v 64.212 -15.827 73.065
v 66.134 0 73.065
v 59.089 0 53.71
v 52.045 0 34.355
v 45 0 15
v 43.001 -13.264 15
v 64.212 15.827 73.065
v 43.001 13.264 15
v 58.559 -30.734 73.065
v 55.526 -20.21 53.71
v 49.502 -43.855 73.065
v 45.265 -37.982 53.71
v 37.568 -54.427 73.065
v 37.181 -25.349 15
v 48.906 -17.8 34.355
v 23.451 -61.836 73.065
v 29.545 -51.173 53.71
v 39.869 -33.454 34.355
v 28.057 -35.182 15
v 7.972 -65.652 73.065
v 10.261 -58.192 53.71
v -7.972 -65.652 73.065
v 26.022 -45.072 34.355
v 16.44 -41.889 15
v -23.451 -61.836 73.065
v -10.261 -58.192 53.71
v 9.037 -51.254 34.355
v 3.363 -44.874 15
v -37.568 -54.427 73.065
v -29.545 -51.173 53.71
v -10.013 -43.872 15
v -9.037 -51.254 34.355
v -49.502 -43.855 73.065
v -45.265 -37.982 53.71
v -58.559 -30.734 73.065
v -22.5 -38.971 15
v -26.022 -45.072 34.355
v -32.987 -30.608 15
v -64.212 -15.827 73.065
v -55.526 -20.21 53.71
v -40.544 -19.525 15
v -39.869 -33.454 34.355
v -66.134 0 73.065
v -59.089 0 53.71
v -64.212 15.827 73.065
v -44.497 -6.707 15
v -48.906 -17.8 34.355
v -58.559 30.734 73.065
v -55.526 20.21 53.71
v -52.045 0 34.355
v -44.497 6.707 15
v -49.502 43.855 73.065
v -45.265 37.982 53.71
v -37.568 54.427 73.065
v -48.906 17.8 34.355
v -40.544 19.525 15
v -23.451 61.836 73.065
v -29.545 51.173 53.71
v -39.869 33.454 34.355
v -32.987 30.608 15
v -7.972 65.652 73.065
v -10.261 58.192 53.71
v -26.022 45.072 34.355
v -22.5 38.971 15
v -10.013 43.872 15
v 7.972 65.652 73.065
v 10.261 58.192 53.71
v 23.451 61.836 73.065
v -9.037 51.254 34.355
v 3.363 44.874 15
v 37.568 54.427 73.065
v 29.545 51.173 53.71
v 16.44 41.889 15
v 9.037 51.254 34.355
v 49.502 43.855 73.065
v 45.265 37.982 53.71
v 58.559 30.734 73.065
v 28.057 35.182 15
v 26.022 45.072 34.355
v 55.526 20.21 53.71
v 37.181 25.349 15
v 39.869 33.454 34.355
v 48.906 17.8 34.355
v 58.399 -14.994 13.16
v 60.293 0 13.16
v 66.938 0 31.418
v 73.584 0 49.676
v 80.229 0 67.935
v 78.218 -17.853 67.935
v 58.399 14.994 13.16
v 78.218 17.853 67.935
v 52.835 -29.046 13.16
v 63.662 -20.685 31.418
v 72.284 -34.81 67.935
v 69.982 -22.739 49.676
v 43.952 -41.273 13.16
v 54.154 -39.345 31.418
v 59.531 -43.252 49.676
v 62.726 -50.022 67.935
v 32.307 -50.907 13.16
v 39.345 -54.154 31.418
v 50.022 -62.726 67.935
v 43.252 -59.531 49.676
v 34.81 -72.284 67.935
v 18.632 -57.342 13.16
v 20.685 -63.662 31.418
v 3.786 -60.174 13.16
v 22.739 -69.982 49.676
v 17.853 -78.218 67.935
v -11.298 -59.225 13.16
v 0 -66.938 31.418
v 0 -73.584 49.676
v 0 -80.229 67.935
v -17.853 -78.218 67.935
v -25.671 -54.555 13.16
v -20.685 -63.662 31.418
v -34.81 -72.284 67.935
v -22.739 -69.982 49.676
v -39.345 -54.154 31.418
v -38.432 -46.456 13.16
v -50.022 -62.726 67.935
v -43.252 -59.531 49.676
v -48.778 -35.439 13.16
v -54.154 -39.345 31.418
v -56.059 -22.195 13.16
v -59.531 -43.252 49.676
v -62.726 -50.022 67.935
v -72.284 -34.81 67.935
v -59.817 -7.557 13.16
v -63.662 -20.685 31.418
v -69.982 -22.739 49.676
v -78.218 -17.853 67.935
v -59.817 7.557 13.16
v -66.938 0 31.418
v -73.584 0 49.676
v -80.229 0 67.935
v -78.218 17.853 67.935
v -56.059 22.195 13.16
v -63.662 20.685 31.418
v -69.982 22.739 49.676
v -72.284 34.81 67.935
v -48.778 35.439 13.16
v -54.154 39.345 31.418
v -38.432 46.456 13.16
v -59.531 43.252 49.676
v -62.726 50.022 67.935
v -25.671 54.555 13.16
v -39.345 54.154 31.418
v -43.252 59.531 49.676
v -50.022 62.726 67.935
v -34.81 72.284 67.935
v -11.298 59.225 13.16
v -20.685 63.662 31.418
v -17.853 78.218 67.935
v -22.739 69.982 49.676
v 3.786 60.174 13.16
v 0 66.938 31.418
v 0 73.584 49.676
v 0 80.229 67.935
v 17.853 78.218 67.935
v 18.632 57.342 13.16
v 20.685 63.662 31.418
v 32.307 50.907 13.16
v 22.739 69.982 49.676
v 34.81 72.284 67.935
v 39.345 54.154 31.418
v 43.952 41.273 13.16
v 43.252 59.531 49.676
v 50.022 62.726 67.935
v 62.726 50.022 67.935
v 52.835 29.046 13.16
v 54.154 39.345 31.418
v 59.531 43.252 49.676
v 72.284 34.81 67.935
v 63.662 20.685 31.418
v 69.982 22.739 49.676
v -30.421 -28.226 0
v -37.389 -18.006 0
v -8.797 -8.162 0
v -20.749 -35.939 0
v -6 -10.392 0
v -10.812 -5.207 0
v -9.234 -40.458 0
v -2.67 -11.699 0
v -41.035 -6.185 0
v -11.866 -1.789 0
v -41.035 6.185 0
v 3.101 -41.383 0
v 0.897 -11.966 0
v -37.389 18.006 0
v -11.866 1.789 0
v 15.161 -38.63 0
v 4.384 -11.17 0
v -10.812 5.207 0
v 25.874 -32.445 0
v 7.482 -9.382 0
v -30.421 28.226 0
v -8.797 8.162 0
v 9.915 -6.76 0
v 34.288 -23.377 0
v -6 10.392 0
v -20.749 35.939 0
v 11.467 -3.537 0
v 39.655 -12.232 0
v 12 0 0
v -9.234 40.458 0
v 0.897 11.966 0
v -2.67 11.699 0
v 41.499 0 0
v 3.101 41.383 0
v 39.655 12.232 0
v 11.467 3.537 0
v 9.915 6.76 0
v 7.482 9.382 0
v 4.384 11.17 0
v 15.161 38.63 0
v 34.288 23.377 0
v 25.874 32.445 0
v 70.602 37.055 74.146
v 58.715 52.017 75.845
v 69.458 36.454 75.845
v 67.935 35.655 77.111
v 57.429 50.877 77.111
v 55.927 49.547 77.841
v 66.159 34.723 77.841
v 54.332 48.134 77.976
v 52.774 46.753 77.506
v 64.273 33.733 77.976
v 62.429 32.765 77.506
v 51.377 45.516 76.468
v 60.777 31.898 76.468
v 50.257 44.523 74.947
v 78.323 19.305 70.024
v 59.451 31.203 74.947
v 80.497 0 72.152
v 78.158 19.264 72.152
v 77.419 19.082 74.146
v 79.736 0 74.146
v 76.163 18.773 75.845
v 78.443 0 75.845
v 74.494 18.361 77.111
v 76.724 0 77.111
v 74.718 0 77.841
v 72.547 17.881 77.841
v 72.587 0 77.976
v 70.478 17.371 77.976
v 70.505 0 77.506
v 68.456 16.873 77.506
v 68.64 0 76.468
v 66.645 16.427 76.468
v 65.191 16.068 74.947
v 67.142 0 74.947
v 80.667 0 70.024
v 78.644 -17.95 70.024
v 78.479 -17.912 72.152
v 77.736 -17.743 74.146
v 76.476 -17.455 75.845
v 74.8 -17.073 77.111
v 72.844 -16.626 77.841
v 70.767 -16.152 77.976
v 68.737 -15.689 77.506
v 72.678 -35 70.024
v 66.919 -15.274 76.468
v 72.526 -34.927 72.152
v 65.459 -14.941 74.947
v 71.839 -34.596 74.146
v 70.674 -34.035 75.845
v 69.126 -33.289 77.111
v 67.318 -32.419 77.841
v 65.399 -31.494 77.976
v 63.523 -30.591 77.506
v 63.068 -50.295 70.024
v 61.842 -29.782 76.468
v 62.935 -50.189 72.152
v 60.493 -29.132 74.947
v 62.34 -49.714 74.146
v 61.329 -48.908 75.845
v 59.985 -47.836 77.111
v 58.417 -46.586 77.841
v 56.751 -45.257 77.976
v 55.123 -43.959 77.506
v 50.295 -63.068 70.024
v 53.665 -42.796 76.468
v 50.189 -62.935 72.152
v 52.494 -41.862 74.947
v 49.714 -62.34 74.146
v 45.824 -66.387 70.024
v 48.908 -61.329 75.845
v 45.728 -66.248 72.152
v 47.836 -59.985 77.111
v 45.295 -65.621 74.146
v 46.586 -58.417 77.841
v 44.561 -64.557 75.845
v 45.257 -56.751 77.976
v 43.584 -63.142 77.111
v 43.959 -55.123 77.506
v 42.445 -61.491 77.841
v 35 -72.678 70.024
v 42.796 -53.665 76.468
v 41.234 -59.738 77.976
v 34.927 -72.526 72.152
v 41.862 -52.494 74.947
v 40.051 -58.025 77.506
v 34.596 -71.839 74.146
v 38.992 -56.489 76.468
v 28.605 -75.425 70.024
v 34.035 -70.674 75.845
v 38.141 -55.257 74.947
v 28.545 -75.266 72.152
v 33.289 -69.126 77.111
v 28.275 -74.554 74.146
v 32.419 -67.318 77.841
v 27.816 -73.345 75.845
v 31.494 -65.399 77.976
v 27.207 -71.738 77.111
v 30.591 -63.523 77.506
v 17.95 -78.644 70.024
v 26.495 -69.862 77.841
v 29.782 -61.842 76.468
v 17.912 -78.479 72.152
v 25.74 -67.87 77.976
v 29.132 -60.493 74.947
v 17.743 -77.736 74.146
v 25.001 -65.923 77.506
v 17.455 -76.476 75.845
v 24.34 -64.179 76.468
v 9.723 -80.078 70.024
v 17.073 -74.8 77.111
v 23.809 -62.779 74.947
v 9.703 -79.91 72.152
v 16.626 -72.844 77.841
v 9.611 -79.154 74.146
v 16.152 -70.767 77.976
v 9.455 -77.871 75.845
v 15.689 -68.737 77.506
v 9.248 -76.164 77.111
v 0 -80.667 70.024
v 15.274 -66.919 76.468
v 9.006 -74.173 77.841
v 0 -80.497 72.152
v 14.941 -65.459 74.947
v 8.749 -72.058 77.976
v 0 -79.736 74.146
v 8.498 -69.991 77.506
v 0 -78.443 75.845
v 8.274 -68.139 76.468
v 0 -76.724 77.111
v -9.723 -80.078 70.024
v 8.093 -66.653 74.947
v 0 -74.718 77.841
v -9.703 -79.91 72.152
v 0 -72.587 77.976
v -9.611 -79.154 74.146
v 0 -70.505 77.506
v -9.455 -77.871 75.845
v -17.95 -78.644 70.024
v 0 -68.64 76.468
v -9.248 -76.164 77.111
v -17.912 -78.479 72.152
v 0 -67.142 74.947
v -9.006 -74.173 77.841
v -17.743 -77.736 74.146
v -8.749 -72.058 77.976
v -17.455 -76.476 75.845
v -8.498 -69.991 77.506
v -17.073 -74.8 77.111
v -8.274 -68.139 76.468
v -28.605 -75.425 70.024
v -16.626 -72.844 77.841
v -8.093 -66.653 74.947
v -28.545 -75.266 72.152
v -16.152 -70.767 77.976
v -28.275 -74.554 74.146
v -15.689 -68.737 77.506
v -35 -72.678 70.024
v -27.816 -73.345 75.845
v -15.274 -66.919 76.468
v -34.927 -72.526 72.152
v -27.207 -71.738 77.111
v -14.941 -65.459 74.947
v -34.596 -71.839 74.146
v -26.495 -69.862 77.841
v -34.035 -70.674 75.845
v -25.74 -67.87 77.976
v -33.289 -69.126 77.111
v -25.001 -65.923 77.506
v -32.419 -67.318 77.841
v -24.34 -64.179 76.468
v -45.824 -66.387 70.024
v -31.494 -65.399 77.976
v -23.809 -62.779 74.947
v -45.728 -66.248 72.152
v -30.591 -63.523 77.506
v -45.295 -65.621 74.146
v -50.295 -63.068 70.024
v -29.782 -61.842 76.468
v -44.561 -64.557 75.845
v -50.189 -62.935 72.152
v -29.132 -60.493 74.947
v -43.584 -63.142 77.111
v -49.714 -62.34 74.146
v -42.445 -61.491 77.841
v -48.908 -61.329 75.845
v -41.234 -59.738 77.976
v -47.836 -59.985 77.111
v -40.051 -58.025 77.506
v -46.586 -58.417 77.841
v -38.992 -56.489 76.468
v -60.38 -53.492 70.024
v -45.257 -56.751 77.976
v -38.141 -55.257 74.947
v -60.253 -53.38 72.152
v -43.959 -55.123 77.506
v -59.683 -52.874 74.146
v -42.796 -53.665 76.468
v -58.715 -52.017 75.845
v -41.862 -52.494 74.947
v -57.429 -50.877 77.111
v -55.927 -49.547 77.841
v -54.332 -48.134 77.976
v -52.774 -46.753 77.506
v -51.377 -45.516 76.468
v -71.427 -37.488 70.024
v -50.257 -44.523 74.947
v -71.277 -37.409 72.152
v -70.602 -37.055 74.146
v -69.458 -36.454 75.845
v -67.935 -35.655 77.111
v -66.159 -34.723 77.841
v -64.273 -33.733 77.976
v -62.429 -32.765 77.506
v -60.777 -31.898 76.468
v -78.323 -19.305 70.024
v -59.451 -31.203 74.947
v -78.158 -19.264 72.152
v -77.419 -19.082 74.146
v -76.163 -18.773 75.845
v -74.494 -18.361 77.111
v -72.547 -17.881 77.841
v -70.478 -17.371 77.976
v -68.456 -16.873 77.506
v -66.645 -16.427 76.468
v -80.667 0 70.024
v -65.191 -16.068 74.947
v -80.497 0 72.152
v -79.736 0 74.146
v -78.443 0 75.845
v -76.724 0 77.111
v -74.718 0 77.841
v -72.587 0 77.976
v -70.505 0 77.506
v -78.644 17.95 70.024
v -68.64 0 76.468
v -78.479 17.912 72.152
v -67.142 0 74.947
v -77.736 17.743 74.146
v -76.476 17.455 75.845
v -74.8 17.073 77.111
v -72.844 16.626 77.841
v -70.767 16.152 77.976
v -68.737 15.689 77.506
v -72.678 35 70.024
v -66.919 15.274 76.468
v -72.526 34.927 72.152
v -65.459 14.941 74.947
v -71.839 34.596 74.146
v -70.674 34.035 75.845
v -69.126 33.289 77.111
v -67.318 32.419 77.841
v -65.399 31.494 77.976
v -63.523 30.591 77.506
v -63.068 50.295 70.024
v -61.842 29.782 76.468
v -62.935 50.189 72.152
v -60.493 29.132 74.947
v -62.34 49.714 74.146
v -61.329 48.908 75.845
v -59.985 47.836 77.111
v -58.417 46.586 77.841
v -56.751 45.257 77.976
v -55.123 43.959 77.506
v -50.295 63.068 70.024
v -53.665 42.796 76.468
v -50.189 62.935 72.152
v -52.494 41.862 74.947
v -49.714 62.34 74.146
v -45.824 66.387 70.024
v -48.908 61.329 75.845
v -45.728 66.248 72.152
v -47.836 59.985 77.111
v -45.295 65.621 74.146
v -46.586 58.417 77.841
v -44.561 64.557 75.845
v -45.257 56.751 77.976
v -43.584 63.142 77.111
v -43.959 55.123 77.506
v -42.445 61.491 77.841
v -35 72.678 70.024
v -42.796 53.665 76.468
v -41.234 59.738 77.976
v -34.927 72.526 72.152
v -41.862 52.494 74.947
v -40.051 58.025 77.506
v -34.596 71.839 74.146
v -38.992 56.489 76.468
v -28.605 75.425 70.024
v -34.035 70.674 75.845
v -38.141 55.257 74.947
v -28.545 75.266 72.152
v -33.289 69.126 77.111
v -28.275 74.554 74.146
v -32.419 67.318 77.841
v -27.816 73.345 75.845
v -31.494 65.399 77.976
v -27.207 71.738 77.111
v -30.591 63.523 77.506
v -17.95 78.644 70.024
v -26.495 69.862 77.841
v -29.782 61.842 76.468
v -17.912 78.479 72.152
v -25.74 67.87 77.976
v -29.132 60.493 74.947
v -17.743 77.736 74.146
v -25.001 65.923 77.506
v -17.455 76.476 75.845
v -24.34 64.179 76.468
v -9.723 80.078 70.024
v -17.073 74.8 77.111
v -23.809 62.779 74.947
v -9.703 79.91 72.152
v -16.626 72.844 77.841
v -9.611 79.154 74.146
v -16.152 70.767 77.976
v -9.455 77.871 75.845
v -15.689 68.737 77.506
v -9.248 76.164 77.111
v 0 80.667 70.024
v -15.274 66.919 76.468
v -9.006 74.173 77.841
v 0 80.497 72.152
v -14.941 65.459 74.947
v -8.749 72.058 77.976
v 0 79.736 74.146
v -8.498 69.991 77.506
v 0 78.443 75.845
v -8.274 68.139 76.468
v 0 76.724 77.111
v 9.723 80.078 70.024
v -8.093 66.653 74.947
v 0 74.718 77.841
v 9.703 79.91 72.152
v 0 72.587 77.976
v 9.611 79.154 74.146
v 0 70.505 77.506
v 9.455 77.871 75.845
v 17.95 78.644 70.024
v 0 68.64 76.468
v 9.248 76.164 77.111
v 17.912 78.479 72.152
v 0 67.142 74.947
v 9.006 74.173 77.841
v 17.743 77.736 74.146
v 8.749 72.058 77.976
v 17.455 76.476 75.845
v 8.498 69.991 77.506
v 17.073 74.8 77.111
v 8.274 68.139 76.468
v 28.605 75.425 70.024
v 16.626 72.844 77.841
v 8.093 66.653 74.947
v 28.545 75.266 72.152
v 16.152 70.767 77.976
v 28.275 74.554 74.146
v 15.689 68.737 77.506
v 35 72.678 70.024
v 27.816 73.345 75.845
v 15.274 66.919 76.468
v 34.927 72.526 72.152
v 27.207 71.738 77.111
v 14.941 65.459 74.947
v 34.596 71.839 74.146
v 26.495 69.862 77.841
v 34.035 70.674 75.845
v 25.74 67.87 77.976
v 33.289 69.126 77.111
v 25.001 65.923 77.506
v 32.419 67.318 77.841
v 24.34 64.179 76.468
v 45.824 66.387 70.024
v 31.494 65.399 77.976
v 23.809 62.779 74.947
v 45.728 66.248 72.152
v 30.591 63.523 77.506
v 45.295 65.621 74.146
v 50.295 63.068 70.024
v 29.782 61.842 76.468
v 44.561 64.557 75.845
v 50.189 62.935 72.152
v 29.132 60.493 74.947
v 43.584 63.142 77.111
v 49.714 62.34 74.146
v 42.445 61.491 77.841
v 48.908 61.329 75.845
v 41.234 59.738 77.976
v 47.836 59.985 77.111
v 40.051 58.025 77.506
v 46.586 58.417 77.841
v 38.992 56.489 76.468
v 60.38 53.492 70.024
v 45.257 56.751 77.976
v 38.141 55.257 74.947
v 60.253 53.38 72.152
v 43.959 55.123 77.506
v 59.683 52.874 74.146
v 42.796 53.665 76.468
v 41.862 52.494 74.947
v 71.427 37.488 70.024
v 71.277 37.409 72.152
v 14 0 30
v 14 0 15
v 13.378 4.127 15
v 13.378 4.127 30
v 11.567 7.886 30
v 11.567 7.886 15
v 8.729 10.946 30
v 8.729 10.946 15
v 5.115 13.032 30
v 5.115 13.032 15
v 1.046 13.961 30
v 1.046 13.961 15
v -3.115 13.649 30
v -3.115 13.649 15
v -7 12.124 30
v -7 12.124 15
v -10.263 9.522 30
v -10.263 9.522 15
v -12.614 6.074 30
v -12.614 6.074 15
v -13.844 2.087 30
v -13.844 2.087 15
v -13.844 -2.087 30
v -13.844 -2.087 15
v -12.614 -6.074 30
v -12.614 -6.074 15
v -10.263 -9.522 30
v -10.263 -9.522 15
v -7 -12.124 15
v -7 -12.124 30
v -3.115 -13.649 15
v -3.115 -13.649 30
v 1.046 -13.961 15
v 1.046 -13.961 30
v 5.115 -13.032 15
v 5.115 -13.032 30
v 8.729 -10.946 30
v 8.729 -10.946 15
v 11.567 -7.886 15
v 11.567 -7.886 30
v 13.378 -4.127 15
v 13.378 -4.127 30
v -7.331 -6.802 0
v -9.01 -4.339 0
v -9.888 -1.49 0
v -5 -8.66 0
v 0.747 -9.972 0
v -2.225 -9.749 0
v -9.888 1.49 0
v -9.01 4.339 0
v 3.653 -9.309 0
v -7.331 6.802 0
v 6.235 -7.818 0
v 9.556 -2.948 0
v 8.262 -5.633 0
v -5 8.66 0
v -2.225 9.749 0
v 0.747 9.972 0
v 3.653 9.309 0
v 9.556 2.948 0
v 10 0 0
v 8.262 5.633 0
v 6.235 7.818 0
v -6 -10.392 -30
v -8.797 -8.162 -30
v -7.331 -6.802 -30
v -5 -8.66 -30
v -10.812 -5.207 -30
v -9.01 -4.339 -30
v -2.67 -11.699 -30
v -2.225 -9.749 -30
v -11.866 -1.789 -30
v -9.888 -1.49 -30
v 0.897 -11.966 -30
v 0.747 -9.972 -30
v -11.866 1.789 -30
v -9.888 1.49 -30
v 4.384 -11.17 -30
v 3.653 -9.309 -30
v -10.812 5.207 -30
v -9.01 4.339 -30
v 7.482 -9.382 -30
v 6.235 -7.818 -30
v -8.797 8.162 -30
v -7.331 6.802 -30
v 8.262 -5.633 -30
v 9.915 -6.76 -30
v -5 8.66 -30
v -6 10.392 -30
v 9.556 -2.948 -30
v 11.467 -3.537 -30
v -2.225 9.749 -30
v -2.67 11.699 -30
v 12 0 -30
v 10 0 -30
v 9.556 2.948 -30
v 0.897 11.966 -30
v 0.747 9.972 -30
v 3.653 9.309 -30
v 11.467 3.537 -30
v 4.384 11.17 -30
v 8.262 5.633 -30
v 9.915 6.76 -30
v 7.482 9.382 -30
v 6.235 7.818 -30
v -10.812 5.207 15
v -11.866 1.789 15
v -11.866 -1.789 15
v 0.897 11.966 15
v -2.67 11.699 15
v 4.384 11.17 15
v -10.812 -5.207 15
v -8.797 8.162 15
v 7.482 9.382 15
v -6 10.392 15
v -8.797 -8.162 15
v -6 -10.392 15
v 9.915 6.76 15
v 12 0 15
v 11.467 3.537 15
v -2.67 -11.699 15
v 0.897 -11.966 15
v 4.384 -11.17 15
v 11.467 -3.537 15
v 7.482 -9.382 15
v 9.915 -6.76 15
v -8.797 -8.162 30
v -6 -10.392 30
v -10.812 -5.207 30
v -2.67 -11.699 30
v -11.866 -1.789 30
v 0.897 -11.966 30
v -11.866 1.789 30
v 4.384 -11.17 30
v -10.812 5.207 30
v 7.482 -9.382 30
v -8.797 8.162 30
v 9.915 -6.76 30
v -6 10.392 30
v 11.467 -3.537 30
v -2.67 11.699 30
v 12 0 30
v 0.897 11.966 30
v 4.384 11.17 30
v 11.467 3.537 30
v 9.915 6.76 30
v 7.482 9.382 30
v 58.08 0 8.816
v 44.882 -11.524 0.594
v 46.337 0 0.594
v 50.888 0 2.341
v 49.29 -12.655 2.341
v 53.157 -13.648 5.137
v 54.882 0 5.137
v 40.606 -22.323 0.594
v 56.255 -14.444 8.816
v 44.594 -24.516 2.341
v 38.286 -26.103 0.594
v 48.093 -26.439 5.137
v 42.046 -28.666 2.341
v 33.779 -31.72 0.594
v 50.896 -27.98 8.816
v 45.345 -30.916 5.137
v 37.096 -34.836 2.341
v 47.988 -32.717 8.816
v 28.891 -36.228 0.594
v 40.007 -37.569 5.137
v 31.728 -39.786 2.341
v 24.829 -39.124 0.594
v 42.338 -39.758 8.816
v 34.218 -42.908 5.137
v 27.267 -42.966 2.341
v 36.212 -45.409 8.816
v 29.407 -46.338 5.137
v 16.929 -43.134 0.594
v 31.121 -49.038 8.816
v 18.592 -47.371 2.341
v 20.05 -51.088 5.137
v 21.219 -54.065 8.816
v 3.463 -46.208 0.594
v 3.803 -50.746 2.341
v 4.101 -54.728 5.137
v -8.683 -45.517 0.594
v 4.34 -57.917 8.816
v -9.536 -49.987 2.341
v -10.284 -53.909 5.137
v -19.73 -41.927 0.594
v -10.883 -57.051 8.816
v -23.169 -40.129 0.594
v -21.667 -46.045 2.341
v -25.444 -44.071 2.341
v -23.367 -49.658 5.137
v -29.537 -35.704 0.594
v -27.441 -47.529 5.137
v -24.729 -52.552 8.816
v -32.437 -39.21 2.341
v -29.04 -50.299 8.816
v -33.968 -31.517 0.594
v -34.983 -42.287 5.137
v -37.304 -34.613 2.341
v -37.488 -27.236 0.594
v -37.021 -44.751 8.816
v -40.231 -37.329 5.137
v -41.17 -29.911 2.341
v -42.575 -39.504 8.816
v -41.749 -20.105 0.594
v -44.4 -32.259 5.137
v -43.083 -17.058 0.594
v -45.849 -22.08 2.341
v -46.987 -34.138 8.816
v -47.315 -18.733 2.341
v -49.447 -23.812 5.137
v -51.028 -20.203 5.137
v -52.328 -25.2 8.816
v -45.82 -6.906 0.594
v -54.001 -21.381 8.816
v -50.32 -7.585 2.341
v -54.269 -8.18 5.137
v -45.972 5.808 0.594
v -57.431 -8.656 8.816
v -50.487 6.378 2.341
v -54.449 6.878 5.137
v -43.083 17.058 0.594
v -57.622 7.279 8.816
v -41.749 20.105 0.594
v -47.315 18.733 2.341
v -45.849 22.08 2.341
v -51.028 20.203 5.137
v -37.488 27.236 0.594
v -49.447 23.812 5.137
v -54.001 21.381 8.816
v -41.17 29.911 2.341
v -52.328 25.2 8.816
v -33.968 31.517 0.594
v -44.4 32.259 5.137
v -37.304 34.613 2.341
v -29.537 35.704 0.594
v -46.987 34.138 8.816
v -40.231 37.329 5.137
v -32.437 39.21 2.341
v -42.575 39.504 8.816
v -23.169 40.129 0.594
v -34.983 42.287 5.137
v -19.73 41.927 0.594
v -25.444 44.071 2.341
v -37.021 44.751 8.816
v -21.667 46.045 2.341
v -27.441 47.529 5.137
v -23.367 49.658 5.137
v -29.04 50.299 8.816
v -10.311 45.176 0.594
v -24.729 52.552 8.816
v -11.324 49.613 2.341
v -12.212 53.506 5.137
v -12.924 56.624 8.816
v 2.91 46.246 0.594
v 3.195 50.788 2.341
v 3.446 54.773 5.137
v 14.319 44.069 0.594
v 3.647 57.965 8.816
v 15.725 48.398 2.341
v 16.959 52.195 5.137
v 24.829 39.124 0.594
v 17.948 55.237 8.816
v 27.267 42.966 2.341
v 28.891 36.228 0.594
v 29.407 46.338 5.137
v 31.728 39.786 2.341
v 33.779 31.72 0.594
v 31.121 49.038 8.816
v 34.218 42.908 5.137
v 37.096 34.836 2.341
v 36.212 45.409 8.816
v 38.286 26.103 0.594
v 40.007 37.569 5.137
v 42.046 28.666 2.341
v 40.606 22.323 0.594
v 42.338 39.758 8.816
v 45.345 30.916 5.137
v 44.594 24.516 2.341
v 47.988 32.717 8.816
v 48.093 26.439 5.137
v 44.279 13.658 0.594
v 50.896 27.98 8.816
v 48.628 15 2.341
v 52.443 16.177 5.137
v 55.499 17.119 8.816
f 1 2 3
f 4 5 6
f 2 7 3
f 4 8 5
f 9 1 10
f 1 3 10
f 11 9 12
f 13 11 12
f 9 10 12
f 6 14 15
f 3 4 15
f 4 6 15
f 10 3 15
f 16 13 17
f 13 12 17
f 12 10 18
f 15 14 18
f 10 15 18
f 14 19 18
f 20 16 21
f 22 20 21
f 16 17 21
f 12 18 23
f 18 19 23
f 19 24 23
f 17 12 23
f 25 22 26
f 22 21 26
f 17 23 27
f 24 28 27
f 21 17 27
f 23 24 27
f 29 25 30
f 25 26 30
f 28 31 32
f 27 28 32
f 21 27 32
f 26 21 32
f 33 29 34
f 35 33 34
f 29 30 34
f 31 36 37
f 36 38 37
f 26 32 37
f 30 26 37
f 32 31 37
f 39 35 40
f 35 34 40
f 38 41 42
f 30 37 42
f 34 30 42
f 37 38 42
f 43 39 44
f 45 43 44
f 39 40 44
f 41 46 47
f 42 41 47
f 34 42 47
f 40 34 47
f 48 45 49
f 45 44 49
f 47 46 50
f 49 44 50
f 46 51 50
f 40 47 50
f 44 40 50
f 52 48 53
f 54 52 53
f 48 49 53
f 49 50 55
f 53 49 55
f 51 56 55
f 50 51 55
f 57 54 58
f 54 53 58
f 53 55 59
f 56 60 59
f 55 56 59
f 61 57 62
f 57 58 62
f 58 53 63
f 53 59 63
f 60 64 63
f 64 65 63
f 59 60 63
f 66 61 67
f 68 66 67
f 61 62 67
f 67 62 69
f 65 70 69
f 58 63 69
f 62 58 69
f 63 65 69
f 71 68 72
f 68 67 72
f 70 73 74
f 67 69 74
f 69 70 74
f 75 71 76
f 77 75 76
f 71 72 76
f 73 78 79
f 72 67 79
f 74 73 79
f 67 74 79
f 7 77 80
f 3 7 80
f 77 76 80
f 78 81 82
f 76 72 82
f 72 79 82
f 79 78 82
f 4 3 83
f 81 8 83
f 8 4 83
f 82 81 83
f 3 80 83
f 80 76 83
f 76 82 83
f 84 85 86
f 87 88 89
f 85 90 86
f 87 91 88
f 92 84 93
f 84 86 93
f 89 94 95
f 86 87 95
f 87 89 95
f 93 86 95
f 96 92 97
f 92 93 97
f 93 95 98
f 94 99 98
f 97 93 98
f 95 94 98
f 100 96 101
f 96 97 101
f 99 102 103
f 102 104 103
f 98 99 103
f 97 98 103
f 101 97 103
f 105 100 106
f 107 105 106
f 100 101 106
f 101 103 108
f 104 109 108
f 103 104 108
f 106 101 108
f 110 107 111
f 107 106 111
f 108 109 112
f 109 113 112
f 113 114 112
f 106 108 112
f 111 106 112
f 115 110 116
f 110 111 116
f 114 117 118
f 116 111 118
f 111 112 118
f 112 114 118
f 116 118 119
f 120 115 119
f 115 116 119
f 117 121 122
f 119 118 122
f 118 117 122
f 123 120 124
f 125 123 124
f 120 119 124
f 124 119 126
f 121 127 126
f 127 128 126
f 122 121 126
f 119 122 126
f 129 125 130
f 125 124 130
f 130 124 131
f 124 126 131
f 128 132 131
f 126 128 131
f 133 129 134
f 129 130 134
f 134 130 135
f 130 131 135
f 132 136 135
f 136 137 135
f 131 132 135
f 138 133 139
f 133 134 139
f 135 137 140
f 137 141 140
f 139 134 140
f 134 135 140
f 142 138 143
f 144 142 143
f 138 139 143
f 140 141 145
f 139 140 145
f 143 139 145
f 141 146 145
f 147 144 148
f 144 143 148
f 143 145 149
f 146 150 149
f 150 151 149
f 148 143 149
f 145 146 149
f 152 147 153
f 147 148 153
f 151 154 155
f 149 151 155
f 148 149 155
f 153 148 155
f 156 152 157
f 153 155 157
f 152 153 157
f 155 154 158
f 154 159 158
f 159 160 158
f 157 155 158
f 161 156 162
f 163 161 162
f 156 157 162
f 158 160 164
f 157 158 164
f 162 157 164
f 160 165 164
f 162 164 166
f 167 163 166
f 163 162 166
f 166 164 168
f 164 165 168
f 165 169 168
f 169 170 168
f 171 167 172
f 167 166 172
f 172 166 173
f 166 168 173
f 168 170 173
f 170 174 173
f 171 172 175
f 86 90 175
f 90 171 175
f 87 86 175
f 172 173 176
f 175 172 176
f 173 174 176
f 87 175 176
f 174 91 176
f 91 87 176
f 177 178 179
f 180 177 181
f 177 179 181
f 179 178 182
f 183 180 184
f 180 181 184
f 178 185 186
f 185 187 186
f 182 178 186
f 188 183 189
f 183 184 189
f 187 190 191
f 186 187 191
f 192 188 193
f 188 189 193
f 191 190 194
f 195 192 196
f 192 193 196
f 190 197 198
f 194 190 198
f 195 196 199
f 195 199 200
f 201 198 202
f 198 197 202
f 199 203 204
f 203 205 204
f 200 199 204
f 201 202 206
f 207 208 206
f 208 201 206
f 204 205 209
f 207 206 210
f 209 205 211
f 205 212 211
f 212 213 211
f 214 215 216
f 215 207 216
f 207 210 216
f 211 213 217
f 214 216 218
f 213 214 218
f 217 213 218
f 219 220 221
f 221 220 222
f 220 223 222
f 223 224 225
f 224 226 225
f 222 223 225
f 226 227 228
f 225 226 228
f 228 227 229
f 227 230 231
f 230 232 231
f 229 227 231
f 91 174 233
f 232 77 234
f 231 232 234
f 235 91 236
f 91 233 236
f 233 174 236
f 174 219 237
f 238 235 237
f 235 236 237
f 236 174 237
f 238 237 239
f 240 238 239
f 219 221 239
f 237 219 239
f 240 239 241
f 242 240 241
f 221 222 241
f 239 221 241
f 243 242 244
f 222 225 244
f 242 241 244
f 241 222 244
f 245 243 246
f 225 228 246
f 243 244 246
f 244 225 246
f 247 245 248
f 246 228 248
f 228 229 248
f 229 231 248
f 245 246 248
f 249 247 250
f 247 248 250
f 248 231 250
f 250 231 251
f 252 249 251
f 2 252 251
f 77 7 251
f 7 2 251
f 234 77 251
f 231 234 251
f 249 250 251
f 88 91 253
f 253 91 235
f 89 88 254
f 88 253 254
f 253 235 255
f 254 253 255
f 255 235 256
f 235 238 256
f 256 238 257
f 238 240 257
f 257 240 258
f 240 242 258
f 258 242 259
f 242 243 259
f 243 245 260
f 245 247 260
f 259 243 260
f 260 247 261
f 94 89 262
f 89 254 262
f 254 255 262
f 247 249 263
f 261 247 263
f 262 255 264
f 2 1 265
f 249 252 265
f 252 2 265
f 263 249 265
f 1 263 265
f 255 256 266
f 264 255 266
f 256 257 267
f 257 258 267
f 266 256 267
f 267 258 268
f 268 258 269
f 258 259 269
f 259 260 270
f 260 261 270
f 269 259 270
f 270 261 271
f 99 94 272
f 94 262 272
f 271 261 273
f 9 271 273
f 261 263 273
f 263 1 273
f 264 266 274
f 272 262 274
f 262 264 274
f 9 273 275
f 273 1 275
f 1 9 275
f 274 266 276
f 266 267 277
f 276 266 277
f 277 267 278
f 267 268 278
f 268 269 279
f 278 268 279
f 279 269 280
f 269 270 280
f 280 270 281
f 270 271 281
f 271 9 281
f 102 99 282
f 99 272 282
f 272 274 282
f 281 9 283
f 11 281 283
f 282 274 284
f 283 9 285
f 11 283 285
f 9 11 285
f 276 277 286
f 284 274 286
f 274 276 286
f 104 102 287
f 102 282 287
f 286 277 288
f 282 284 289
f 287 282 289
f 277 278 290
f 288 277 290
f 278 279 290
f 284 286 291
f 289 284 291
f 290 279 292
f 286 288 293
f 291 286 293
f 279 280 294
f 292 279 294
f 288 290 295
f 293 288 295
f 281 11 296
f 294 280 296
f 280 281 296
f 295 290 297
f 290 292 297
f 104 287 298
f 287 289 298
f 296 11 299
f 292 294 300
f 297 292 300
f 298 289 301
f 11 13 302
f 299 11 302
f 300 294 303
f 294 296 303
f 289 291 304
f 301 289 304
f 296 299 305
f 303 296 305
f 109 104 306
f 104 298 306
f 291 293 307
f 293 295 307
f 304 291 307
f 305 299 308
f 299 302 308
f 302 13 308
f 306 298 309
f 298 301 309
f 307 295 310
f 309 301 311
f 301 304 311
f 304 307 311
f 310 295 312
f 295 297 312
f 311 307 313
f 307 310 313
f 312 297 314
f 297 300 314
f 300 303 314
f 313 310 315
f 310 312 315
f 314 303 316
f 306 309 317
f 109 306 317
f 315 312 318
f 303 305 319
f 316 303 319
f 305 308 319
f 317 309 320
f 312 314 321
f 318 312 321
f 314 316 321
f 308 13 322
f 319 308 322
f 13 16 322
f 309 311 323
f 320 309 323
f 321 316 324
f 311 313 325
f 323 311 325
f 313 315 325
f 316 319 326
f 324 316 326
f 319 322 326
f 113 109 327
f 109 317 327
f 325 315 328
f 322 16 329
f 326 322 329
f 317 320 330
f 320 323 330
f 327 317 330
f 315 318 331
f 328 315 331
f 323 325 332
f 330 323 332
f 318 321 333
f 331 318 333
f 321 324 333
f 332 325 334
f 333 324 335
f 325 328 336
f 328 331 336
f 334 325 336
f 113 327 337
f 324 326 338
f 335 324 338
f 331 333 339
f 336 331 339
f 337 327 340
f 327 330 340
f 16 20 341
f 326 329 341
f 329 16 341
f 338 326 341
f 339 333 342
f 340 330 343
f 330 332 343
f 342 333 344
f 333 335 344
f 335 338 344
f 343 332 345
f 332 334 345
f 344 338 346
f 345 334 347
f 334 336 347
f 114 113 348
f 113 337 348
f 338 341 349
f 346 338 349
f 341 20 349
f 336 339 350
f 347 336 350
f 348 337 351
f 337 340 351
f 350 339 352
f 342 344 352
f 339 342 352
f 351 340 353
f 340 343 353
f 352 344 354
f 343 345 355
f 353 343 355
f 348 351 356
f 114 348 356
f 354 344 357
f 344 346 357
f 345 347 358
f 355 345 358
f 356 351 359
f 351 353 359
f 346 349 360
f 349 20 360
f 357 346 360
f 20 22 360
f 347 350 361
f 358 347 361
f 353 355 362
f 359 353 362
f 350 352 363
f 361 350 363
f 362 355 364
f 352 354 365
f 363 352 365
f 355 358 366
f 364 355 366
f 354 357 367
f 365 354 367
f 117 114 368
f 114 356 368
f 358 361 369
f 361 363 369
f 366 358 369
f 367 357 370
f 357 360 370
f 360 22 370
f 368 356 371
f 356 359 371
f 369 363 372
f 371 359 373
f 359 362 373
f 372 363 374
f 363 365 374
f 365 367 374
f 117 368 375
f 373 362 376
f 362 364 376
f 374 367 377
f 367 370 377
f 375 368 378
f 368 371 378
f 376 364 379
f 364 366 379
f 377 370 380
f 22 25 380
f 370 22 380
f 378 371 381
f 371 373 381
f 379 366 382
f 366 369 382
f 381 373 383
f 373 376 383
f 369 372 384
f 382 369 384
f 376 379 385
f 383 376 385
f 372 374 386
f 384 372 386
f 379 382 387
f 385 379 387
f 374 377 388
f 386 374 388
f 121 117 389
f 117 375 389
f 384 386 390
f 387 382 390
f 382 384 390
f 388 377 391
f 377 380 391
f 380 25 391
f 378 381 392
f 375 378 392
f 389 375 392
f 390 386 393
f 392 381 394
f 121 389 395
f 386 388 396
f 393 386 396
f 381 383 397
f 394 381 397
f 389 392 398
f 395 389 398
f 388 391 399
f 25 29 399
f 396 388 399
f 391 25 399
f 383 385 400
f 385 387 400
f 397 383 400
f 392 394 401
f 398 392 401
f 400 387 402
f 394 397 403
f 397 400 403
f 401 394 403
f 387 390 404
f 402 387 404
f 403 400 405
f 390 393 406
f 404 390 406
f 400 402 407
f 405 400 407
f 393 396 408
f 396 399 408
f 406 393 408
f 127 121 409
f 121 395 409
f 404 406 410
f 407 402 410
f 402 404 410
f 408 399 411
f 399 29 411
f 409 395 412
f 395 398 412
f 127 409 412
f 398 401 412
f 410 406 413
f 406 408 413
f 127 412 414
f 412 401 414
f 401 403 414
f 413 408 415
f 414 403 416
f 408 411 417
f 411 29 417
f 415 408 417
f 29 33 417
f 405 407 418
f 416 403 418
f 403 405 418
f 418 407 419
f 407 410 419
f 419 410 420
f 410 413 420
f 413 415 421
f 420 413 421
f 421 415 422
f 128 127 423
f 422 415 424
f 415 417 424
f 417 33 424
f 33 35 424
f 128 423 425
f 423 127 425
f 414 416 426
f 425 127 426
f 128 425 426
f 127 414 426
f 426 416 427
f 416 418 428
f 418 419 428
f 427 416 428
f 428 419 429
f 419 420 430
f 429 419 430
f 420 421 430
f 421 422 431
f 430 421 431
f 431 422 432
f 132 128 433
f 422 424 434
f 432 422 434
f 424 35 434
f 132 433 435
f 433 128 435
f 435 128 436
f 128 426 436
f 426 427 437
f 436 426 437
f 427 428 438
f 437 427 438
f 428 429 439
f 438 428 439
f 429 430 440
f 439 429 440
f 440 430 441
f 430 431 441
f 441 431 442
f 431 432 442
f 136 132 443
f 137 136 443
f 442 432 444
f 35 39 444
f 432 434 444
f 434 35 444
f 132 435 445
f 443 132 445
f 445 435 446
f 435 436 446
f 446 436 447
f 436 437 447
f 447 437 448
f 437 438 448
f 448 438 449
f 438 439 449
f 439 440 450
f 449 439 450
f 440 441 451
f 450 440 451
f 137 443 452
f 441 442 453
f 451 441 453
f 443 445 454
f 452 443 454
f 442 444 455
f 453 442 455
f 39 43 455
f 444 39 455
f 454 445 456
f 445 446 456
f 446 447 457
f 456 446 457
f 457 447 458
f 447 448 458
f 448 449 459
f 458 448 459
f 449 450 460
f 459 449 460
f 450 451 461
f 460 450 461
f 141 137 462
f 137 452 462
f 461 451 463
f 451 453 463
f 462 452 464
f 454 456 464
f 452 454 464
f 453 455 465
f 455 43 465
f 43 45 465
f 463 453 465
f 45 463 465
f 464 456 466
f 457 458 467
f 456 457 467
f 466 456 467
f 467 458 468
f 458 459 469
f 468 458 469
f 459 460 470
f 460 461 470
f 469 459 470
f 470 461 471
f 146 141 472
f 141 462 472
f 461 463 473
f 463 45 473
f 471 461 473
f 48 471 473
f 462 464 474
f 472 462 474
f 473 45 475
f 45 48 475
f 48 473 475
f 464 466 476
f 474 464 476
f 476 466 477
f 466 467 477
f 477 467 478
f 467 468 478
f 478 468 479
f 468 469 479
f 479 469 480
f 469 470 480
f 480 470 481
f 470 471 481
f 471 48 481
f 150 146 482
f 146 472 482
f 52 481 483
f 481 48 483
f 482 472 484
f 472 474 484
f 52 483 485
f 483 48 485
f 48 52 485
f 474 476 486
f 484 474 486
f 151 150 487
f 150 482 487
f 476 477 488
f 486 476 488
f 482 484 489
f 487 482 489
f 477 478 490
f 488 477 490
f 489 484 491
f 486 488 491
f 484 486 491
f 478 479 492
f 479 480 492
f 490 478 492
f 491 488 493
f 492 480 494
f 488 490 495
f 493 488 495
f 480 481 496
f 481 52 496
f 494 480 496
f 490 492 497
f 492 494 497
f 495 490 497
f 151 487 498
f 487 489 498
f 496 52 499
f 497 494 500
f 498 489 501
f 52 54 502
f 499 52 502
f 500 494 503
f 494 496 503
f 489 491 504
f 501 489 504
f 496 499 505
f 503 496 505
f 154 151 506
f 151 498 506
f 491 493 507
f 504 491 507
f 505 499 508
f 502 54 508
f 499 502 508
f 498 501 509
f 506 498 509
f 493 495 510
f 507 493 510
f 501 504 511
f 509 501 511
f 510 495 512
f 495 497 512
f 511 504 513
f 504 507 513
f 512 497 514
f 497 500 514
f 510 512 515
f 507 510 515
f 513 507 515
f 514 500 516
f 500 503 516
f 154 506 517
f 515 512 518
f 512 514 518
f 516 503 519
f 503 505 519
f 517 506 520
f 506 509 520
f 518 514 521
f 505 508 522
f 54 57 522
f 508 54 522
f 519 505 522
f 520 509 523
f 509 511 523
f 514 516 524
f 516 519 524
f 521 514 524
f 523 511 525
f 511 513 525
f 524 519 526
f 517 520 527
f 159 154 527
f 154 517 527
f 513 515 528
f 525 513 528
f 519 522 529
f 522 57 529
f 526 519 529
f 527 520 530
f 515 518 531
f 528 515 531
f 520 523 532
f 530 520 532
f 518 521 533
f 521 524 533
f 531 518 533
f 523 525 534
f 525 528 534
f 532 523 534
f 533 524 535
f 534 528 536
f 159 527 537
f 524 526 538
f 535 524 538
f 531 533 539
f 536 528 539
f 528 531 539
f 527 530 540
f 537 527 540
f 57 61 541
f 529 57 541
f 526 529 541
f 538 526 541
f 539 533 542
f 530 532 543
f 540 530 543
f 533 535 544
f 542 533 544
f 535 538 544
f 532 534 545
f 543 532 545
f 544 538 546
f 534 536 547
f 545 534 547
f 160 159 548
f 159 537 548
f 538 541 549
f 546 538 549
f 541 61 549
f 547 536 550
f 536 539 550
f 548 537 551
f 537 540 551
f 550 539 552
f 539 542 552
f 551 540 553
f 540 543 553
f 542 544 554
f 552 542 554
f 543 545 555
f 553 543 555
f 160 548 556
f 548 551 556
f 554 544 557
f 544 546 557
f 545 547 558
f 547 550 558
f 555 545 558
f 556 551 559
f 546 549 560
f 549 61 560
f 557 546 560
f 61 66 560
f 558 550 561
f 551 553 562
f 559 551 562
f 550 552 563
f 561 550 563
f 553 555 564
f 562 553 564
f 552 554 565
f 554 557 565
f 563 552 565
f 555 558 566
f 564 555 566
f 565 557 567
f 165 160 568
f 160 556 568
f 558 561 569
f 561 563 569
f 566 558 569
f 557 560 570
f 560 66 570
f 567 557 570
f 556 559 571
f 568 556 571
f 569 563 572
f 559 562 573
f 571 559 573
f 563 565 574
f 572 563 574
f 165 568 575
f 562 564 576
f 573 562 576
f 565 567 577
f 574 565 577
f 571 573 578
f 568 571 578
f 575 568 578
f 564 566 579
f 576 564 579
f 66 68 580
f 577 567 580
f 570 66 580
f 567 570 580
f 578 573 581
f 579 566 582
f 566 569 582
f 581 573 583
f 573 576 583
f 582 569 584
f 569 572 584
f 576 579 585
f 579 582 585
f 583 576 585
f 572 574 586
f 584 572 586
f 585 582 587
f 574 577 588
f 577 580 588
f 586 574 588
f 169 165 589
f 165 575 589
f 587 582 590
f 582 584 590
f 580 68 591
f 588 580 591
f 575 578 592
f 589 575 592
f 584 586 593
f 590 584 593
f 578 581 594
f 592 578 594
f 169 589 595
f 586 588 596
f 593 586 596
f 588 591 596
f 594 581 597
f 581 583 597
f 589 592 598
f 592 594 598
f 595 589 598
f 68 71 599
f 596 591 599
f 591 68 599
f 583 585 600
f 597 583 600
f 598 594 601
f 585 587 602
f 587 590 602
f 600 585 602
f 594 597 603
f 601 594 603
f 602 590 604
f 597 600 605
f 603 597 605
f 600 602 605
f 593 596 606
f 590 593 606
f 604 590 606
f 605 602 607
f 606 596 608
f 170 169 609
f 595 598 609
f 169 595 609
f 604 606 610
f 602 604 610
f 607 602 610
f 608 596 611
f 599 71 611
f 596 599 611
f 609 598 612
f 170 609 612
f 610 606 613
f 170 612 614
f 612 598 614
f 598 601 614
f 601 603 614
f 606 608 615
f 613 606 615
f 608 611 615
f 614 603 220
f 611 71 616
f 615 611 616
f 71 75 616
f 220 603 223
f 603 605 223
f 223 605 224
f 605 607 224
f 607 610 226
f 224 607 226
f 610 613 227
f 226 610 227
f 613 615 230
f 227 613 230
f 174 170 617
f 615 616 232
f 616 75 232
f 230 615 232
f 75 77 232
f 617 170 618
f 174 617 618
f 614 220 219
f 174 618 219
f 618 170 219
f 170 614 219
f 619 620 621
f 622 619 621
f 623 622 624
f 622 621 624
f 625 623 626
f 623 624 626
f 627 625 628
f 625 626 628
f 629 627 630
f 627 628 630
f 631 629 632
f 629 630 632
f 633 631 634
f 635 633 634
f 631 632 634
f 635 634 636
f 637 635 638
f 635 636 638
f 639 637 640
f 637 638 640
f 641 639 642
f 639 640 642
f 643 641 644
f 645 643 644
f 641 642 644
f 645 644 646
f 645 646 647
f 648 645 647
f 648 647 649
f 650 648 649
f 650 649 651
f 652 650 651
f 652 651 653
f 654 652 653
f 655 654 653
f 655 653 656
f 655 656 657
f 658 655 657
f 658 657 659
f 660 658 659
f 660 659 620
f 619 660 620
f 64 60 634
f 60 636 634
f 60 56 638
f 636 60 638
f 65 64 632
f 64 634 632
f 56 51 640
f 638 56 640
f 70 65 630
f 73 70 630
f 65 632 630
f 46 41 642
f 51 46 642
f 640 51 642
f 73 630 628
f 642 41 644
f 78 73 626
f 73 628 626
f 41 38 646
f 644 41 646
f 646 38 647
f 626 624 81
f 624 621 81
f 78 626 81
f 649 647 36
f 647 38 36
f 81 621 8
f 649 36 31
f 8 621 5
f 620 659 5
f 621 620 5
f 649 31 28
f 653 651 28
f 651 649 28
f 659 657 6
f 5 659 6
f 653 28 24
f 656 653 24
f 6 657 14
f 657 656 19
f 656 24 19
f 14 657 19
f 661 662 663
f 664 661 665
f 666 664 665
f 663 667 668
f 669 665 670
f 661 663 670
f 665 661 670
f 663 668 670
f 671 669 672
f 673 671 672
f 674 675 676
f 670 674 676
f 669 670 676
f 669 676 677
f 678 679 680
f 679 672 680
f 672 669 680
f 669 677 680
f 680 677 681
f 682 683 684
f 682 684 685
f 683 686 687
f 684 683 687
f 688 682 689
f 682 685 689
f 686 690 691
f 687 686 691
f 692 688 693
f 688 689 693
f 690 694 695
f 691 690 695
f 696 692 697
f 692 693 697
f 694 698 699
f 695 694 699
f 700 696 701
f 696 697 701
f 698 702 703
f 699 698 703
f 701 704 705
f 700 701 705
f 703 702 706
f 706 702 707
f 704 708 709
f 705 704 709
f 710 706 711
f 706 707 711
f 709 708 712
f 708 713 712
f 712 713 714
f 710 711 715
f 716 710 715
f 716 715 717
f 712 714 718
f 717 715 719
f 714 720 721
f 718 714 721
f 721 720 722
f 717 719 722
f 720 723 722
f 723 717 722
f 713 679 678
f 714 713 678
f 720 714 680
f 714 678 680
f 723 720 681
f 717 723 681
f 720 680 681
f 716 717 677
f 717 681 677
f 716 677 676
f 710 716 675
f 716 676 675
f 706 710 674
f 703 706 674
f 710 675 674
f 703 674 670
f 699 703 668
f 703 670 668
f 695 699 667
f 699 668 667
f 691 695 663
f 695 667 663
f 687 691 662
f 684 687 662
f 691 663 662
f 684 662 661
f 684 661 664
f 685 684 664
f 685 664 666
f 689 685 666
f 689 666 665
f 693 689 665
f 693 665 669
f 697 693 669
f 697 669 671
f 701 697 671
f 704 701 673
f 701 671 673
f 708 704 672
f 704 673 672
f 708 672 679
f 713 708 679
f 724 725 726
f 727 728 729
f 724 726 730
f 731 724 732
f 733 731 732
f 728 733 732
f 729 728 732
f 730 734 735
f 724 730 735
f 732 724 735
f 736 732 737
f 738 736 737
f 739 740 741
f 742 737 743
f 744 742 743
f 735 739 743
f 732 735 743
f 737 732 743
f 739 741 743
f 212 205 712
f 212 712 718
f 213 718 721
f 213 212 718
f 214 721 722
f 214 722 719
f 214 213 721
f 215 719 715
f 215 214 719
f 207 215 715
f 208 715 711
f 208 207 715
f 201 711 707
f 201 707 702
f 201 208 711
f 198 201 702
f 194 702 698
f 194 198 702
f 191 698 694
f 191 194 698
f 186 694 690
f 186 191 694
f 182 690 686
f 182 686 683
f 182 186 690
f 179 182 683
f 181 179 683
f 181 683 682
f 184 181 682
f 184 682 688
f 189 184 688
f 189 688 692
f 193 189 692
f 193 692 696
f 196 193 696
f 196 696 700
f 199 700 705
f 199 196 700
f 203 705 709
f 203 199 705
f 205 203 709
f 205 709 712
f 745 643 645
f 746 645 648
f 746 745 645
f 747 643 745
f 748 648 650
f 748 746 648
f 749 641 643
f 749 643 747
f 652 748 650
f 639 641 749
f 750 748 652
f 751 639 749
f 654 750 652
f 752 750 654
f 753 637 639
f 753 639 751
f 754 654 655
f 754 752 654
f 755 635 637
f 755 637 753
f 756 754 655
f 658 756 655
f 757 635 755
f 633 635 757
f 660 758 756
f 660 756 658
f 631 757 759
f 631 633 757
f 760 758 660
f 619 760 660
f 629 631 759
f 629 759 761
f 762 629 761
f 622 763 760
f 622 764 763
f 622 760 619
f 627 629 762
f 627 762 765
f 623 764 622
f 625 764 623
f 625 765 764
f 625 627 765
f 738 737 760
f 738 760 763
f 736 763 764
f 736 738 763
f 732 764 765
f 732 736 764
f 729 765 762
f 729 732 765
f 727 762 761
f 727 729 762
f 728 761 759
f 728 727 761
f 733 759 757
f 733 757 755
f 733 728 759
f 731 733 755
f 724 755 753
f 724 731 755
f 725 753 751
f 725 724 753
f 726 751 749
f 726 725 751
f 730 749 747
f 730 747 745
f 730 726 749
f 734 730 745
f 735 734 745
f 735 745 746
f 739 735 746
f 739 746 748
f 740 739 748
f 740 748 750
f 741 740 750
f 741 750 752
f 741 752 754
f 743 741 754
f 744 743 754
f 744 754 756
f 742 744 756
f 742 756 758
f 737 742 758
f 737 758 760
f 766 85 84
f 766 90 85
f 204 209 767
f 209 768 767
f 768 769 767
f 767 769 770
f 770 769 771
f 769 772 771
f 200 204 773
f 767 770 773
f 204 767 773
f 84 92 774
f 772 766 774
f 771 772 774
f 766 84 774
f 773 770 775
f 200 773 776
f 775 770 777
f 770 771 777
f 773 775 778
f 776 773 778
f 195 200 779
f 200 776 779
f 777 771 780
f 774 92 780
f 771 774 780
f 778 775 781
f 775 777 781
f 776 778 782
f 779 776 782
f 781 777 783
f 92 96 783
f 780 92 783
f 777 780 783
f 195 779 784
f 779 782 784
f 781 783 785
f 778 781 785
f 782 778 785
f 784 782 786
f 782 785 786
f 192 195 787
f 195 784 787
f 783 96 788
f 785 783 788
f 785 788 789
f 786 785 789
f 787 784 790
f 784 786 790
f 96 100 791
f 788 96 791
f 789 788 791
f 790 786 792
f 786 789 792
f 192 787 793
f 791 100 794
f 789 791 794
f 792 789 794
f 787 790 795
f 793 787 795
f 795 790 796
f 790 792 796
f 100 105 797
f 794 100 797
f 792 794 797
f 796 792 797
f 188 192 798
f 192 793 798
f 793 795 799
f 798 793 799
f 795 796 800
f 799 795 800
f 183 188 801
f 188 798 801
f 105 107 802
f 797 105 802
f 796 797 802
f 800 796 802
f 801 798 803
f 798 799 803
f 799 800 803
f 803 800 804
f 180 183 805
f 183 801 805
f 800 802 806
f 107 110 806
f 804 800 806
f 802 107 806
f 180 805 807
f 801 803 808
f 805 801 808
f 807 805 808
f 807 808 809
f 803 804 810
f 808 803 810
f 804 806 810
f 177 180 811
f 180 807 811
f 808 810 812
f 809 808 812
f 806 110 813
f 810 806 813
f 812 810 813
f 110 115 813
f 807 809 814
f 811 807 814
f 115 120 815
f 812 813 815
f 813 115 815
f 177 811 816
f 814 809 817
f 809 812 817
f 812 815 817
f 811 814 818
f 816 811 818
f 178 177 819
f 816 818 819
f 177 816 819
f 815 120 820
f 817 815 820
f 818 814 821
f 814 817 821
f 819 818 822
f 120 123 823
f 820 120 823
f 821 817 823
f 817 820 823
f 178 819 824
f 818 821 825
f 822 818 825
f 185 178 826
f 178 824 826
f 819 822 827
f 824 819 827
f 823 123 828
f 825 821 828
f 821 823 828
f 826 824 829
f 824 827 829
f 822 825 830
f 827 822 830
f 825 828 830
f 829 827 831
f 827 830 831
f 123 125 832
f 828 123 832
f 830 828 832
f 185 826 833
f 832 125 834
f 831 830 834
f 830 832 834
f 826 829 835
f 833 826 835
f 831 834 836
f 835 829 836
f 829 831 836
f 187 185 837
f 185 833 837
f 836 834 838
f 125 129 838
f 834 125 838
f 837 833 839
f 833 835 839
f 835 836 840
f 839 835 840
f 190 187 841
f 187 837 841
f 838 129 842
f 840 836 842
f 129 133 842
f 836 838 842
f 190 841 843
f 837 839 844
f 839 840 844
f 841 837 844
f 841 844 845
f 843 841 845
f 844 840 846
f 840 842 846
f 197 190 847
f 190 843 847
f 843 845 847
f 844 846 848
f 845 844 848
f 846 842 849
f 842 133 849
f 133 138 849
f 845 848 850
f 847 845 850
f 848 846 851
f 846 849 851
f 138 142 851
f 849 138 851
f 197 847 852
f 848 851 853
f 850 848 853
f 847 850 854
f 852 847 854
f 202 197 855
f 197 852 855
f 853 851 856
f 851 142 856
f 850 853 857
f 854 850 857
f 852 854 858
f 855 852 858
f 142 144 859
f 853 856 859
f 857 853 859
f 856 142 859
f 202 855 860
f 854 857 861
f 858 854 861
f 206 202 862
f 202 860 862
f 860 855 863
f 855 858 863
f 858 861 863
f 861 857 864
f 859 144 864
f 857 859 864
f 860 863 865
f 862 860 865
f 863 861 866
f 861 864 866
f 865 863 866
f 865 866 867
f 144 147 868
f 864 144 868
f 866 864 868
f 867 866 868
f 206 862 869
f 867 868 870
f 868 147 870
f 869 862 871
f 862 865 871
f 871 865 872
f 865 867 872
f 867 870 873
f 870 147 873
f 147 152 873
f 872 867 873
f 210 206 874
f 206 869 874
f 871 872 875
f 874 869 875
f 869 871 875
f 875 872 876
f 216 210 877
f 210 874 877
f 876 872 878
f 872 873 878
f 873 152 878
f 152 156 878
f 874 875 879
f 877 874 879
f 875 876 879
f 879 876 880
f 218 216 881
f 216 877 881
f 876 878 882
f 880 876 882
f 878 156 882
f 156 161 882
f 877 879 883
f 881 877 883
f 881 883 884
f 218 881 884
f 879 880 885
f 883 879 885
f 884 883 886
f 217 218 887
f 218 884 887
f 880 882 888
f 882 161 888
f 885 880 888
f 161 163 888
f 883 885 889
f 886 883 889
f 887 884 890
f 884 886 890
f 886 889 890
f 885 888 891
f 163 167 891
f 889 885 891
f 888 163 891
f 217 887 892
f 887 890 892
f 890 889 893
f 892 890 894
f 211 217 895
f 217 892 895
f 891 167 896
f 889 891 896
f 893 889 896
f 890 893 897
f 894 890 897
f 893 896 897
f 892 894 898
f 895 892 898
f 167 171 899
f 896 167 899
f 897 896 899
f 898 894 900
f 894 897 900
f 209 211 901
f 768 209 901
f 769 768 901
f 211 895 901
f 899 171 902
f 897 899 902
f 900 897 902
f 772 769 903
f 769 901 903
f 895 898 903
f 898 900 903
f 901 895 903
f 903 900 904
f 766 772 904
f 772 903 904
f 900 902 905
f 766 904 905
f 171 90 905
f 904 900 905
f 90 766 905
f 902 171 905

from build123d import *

# Parameters (mm, degrees)
F2_R     = 14
F2_R_2   = 12
F3_DEPTH = 30
F2_R_3   = 10
F4_DEPTH = 30


with BuildPart() as f1:
    # F0 (on Front) → F1 (revolve)
    with BuildSketch(Plane.XZ):
        with BuildLine():
            Line((0, 15), (0, 0))
            Line((0, 0), (41.498962, 0))
            ThreePointArc((41.498962, 0), (52.970491, 3.616959), (60.292815, 13.159597))
            Line((60.292815, 13.159597), (80.229376, 67.934849))
            ThreePointArc((80.229376, 67.934849), (75.746832, 77.547695), (66.133987, 73.065151))
            Line((66.133987, 73.065151), (45, 15))
            Line((45, 15), (0, 15))
        make_face()
    revolve(axis=Axis((0, 0, 7.5), (0, 0, -1)))

    # F2 (on Top) → F3 (join)
    with BuildSketch(Plane.XY):
        Circle(F2_R)
        Circle(F2_R_2, mode=Mode.SUBTRACT)
    extrude(amount=F3_DEPTH)

    # F2 (on Top) → F4 (join)
    with BuildSketch(Plane.XY):
        Circle(F2_R_2)
        Circle(F2_R_3, mode=Mode.SUBTRACT)
    extrude(amount=-F4_DEPTH)


solid = f1.part
